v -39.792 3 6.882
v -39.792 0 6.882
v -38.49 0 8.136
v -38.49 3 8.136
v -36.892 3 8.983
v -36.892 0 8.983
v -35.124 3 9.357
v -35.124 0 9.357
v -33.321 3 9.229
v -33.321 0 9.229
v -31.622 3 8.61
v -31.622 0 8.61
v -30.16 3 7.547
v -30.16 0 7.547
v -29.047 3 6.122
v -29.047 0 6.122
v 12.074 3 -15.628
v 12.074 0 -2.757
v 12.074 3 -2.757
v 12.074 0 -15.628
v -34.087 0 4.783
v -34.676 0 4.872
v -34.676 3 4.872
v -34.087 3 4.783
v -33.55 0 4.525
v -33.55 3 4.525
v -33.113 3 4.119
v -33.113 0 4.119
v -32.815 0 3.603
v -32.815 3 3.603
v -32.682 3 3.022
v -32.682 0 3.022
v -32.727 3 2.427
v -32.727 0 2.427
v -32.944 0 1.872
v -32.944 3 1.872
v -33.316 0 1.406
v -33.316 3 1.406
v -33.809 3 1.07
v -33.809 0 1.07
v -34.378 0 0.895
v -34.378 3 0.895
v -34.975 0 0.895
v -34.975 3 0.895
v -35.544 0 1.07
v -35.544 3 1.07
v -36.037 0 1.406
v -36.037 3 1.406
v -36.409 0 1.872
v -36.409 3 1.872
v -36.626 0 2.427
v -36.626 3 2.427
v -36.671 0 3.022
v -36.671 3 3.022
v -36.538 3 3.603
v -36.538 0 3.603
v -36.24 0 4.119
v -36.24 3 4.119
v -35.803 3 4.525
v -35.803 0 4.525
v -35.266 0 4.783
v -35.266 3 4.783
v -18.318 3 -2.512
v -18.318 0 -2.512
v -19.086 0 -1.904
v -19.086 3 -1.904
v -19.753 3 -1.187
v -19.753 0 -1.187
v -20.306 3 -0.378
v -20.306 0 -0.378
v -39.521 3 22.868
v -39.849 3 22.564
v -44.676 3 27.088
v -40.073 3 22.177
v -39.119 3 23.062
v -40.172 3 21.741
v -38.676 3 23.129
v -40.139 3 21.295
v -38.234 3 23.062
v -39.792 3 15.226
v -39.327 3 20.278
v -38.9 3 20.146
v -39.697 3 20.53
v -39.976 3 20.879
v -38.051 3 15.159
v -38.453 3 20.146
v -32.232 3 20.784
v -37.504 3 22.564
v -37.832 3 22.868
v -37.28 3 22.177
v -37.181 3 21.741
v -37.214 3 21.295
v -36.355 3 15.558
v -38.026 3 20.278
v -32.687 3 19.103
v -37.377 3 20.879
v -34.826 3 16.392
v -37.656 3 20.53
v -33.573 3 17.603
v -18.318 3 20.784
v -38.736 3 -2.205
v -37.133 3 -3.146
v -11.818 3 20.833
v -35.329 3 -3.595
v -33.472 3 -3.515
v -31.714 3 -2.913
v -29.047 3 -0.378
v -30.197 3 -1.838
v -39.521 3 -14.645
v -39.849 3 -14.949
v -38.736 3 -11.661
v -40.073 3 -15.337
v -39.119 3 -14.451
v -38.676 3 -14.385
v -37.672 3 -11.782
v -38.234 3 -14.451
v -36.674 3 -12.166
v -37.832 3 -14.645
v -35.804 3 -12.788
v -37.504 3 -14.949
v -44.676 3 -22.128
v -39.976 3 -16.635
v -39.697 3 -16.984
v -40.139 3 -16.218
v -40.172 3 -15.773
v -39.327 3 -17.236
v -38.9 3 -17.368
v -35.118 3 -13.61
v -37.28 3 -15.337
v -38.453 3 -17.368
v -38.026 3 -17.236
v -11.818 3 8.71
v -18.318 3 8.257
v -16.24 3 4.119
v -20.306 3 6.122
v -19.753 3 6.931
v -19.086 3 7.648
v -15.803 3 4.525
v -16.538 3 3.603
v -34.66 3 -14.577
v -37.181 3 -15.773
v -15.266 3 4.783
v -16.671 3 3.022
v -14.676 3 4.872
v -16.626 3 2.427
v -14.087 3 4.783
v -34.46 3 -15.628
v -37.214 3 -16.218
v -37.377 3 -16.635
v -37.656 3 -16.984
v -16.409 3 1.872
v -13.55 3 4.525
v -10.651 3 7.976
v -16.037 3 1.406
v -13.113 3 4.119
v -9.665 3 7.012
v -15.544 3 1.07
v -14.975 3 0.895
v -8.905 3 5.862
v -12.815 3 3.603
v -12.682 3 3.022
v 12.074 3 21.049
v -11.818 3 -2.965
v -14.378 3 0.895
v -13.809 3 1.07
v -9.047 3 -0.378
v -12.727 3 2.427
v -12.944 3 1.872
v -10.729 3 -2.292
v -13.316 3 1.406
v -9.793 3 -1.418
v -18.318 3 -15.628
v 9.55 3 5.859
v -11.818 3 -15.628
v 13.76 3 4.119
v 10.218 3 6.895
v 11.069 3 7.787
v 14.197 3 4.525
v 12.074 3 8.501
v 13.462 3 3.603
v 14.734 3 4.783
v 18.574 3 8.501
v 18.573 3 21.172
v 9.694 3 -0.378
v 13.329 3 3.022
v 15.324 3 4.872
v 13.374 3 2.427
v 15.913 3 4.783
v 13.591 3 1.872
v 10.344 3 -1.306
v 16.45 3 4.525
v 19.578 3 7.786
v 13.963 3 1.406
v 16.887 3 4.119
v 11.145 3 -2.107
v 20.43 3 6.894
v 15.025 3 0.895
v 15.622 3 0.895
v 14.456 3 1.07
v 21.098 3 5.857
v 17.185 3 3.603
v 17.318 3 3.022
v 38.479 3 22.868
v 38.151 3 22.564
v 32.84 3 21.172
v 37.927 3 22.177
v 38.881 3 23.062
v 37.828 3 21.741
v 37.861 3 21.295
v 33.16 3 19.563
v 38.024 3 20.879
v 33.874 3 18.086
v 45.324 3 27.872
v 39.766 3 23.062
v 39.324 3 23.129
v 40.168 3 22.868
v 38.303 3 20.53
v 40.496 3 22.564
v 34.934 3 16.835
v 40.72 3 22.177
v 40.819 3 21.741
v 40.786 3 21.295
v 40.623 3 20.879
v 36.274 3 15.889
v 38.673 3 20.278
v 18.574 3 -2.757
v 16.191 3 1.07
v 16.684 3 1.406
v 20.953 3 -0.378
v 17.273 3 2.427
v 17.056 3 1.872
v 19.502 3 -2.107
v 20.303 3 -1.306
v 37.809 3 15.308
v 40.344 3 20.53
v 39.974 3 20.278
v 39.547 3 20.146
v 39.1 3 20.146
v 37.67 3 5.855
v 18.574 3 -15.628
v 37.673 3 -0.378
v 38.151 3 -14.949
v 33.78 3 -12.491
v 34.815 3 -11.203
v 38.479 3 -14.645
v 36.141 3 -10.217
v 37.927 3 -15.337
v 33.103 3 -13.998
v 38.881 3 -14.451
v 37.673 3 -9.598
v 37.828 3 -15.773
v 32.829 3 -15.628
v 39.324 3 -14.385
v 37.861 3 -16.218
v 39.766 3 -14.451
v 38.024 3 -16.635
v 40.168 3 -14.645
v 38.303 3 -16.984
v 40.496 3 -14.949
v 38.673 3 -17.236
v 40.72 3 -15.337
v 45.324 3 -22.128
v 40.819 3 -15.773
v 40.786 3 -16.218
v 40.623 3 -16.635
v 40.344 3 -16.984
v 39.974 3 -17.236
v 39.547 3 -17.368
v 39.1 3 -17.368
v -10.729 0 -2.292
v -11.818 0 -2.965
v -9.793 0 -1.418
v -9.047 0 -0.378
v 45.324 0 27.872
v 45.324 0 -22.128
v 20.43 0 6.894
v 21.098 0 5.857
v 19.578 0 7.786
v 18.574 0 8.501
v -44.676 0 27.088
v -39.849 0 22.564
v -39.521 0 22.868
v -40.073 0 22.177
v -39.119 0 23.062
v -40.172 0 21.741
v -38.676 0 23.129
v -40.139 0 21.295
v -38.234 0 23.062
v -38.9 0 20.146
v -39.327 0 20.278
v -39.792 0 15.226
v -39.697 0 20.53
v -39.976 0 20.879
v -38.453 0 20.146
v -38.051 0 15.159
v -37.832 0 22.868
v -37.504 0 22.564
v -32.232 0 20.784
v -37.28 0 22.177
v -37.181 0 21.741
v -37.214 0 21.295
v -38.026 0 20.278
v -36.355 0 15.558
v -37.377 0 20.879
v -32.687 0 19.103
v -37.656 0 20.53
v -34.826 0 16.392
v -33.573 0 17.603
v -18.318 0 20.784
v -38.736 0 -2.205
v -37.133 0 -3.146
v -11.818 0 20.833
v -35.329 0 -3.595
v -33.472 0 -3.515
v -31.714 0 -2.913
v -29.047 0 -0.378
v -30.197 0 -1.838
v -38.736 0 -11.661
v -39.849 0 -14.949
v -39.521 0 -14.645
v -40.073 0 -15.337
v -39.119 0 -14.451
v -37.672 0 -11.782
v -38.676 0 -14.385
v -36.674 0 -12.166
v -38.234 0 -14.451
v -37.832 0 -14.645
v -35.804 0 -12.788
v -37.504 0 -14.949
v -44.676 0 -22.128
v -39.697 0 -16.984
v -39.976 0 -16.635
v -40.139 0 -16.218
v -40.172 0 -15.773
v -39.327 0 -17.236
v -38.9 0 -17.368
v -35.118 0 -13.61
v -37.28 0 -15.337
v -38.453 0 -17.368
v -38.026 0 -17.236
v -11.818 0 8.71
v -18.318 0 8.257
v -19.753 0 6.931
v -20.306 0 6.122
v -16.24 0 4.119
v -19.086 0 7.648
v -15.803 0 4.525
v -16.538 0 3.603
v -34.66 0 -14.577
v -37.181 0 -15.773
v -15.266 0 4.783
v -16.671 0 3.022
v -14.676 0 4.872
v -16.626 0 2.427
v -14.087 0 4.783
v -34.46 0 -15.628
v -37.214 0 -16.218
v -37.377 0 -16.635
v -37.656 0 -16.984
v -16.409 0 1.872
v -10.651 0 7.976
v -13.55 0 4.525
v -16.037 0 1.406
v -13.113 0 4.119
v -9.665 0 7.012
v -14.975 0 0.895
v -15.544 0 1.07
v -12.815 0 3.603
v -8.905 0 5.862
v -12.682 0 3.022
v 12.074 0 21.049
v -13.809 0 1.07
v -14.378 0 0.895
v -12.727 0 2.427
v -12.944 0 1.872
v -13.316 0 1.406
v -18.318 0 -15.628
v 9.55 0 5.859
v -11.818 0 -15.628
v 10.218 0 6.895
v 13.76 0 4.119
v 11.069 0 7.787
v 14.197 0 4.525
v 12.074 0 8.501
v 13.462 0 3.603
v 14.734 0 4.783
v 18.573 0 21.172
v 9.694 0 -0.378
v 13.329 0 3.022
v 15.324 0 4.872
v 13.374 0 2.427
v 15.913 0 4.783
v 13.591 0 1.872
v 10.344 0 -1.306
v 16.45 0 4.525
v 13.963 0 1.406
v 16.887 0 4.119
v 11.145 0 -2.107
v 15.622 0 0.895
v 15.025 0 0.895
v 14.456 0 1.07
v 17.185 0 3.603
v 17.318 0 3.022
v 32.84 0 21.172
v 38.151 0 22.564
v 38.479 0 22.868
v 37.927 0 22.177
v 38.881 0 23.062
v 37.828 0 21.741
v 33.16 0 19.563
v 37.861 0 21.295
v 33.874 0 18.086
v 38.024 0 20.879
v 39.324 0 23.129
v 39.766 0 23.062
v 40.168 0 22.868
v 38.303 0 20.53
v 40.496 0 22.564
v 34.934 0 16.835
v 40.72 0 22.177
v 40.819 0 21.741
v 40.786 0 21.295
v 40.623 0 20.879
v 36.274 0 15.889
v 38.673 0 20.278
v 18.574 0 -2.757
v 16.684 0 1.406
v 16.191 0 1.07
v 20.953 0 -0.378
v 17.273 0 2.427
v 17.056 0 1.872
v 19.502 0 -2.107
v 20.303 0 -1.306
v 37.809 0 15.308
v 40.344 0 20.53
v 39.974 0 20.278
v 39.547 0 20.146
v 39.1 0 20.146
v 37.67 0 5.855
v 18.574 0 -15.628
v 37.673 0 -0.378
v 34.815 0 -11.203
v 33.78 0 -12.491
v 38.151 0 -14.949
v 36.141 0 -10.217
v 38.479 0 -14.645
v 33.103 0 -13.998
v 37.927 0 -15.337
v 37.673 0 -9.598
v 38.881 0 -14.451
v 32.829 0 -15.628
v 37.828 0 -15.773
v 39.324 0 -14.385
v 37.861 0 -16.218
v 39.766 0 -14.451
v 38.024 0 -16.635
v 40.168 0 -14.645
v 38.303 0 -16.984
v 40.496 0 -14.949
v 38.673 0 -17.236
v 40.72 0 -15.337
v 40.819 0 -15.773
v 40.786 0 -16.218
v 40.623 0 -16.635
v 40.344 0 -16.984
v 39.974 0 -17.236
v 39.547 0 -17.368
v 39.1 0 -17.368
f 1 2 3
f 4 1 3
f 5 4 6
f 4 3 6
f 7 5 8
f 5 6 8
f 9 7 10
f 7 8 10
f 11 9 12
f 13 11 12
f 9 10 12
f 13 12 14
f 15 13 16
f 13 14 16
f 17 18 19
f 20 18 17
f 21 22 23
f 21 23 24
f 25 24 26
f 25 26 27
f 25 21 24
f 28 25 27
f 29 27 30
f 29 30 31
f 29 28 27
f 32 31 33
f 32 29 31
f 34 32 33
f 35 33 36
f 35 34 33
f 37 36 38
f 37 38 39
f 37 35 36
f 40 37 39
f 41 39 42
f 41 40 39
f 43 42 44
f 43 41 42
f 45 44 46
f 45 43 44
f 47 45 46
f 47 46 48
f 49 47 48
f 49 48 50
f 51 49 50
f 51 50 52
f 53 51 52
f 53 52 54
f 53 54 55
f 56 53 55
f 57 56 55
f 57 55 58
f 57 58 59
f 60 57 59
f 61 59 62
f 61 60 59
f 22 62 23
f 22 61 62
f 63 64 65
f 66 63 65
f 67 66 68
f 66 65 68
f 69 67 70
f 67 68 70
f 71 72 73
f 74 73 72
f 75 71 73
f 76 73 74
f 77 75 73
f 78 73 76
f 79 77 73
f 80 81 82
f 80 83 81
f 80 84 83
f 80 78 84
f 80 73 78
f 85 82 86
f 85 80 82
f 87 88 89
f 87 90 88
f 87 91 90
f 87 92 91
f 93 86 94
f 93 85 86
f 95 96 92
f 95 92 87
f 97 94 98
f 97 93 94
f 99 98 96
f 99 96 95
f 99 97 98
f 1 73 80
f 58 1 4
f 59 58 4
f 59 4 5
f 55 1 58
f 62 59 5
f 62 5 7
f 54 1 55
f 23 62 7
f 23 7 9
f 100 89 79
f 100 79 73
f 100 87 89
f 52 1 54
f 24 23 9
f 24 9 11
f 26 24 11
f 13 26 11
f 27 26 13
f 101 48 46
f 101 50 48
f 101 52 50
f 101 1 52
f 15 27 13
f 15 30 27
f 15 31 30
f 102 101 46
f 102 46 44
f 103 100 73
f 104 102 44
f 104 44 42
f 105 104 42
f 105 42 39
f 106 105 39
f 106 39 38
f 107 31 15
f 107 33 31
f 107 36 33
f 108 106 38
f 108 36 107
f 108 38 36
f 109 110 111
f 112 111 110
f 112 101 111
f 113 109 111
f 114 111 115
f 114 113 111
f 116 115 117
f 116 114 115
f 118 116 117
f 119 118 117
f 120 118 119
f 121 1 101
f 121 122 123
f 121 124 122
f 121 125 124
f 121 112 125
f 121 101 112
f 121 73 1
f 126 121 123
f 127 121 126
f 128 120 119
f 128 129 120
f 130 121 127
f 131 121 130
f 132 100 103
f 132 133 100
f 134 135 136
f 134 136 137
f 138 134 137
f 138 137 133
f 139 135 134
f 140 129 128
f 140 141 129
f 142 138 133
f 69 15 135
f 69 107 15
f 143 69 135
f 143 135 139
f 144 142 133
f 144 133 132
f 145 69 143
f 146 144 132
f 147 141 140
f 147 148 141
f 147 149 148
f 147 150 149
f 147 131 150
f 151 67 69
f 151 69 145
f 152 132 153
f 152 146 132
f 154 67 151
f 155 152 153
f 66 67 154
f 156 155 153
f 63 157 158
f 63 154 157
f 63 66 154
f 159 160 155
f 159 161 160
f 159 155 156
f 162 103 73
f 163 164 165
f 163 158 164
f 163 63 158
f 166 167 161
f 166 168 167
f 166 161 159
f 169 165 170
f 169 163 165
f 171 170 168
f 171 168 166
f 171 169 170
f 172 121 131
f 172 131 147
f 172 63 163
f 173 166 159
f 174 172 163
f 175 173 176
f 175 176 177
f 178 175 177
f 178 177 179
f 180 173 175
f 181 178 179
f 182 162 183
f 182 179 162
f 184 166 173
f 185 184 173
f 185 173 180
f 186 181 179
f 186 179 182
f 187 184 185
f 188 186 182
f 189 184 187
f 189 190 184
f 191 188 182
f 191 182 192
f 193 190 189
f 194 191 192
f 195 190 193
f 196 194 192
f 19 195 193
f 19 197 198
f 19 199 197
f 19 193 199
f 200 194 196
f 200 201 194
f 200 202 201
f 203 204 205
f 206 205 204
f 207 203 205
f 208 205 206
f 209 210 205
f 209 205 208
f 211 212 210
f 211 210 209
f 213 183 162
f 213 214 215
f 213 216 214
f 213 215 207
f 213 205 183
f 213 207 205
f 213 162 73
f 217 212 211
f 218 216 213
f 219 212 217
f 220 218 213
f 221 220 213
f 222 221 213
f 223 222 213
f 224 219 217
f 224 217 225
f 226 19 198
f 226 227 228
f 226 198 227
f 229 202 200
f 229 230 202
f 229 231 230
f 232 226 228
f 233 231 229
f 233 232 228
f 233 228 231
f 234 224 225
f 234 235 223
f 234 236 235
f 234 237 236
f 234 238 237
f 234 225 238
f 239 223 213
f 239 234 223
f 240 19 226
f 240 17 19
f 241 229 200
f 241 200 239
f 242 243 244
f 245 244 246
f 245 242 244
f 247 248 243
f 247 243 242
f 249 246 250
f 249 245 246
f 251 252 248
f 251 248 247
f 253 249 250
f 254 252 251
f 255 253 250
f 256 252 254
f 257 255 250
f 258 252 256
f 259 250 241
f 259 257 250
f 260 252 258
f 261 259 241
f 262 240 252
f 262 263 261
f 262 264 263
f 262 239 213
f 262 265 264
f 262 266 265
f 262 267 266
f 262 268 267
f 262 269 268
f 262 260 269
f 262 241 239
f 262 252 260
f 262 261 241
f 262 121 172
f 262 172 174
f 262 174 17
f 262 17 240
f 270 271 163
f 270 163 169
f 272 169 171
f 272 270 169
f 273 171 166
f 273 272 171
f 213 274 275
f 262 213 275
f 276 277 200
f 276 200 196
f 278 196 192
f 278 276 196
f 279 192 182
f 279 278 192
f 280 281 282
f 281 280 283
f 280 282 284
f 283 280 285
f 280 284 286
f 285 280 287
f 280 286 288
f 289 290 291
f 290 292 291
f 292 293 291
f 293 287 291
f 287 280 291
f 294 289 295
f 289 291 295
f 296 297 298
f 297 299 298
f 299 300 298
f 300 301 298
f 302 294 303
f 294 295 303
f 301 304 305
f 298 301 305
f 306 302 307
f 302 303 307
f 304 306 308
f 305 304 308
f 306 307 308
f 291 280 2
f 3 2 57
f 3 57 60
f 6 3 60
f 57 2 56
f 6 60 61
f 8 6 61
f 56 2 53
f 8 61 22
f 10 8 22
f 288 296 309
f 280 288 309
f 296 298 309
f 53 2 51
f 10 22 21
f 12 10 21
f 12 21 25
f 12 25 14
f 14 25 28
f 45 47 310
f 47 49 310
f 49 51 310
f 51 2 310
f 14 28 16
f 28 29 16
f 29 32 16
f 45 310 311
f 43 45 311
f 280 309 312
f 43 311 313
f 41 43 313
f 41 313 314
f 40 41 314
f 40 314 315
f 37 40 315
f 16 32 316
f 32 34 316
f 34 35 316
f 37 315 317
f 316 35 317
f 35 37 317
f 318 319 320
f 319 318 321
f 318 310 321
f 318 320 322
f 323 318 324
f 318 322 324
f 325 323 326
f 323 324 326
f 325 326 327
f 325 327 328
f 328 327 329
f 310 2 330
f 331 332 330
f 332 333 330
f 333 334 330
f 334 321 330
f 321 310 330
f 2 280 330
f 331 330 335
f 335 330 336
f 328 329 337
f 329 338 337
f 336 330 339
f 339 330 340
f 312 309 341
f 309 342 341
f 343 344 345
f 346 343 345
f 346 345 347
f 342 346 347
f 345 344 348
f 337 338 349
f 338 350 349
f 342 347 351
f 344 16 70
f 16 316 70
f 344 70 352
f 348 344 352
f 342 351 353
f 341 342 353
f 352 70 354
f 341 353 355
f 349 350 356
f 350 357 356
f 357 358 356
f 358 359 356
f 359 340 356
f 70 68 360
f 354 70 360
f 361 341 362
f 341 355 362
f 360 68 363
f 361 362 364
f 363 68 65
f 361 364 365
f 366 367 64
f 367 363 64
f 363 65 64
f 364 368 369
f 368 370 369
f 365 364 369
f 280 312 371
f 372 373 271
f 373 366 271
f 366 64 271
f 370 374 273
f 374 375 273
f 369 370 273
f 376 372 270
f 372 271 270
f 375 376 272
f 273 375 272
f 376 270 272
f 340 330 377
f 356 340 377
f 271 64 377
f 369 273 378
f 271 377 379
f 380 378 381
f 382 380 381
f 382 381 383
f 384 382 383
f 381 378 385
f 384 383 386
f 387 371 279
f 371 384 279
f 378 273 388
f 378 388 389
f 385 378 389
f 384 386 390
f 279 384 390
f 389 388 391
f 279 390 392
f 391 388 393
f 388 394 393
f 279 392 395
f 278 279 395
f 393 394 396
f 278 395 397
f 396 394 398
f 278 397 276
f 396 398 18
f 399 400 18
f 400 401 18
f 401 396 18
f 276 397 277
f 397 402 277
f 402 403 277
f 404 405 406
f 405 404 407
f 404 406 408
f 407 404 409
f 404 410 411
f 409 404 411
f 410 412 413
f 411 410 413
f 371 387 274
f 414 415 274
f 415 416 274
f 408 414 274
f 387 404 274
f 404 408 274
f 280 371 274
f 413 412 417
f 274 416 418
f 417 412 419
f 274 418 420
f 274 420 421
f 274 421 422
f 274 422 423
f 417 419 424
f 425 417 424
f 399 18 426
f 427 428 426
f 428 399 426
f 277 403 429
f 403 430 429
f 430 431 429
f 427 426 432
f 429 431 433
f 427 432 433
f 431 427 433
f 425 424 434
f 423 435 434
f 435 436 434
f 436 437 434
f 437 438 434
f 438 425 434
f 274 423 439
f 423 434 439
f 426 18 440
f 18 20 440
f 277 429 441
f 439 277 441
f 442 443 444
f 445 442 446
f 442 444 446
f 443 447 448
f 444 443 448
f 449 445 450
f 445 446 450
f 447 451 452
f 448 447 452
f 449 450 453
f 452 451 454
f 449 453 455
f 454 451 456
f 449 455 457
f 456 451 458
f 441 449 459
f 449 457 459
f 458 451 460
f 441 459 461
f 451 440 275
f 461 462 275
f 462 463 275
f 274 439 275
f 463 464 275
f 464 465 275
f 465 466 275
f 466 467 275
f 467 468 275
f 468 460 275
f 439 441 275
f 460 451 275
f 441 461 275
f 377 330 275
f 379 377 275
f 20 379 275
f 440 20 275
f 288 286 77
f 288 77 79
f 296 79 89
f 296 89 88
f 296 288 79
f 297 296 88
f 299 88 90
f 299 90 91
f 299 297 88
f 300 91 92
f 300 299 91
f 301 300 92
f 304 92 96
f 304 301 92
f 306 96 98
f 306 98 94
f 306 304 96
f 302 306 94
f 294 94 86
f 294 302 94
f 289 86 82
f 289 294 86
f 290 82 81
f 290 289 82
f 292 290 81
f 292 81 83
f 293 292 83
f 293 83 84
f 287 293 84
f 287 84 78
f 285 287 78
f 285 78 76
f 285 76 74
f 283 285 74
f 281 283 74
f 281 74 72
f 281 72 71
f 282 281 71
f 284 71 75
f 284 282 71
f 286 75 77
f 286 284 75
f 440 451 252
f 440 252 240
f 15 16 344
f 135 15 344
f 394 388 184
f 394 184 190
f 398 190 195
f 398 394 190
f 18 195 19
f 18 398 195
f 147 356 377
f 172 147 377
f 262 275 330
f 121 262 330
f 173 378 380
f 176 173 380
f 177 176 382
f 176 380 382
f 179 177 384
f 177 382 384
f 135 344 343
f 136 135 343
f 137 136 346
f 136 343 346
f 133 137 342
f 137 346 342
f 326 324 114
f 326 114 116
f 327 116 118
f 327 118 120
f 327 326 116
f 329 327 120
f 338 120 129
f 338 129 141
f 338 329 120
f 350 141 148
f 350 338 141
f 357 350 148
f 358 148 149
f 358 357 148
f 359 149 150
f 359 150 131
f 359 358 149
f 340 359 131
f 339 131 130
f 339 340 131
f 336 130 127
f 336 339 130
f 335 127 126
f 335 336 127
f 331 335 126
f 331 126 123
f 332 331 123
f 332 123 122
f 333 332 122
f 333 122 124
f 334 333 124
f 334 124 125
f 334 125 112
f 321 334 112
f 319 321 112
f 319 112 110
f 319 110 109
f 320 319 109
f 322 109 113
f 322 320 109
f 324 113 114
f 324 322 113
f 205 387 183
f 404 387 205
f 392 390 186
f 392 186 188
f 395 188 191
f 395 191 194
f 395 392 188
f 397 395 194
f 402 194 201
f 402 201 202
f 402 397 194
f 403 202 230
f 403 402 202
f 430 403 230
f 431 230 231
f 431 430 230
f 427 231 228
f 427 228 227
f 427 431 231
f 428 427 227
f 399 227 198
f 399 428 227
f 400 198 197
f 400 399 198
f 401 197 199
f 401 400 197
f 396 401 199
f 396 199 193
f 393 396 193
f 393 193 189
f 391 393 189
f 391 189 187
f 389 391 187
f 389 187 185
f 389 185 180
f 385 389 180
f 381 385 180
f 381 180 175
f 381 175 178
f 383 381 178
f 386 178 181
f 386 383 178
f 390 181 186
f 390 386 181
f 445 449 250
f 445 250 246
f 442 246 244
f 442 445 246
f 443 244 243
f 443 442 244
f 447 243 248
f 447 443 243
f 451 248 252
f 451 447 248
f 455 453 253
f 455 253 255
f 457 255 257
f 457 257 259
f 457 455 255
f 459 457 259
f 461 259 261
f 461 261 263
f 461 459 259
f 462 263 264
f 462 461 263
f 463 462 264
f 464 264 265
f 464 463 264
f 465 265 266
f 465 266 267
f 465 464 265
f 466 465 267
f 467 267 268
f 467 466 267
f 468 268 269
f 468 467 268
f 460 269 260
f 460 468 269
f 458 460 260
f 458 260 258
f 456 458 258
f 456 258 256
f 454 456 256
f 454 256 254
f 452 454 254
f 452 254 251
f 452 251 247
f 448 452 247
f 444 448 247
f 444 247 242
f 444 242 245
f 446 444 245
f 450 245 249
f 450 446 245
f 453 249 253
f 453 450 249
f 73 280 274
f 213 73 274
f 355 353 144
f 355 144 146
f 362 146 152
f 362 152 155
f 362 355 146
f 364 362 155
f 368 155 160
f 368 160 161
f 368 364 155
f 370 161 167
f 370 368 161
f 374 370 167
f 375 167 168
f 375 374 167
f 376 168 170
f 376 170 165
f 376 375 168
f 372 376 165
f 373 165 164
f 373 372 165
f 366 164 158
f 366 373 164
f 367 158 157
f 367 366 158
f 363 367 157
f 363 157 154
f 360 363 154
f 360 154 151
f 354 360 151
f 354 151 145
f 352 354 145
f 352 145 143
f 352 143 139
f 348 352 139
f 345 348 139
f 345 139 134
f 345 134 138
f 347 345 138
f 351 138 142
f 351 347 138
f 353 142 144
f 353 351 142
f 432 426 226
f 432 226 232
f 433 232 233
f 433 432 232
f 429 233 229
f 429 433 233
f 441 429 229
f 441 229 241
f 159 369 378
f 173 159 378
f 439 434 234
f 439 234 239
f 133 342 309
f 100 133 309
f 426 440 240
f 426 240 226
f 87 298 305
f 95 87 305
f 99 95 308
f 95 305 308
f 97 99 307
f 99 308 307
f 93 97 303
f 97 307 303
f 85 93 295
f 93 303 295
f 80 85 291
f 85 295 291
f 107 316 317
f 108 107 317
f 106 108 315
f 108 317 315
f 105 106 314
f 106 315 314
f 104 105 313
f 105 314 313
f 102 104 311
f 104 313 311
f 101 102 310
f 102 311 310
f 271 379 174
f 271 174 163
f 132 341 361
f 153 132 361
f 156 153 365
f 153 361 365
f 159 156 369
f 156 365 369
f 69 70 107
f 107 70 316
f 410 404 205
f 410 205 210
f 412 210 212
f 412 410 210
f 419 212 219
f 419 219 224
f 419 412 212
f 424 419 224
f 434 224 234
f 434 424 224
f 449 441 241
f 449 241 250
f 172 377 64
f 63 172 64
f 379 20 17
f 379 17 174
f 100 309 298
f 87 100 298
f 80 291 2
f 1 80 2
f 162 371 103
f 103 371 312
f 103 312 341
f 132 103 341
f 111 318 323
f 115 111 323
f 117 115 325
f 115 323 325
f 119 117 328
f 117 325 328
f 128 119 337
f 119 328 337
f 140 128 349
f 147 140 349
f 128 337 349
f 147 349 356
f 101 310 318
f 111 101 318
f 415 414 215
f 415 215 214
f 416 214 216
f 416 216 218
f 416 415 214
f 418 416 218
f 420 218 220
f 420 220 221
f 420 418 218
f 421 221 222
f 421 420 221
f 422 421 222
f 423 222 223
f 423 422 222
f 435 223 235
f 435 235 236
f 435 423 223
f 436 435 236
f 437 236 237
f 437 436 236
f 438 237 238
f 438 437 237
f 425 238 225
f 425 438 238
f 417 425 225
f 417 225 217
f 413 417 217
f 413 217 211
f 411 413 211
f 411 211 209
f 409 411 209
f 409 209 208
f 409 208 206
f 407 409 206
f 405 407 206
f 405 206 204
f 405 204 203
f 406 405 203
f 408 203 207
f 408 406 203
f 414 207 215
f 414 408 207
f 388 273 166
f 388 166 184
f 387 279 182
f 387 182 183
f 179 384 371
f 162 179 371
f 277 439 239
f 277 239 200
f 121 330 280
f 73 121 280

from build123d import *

# Parameters (mm, degrees)
SKETCH1_R           = 2
SKETCH1_R_2         = 1.5
BOSS_EXTRUDE1_DEPTH = 3


with BuildPart() as part:
    # Sketch1 → Boss-Extrude1 (new body)
    with BuildSketch(Plane(origin=(0, 0, 0), x_dir=(1, 0, 0), z_dir=(0, 1, 0))):
        Polygon((-44.676492644, 22.127798429), (-44.676492644, -27.087694748), (45.323507356, -27.872201571), (45.323507356, 22.127798429), align=None)
        with Locations(Location((-14.676492644, -2.872201571, 0), (0, 0, 270))):
            Circle(SKETCH1_R, mode=Mode.SUBTRACT)
        with Locations(Location((-34.676492644, -2.872201571, 0), (0, 0, 270))):
            Circle(SKETCH1_R, mode=Mode.SUBTRACT)
        with Locations(Location((15.323507356, -2.872201571, 0), (0, 0, 270))):
            Circle(SKETCH1_R, mode=Mode.SUBTRACT)
        with Locations(Location((-38.676492644, 15.884701617, 0), (0, 0, 270))):
            Circle(SKETCH1_R_2, mode=Mode.SUBTRACT)
        with Locations(Location((-38.676492644, -21.62910476, 0), (0, 0, 270))):
            Circle(SKETCH1_R_2, mode=Mode.SUBTRACT)
        with Locations(Location((39.323507356, 15.884701617, 0), (0, 0, 270))):
            Circle(SKETCH1_R_2, mode=Mode.SUBTRACT)
        with Locations(Location((39.323507356, -21.62910476, 0), (0, 0, 270))):
            Circle(SKETCH1_R_2, mode=Mode.SUBTRACT)
        with BuildLine():
            Line((-34.460456453, 15.627798429), (-18.317725118, 15.627798429))
            Line((-18.317725118, 15.627798429), (-18.317725118, 2.512167108))
            ThreePointArc((-18.317725118, 2.512167108), (-19.4329567, 1.557928187), (-20.305657768, 0.377798429))
            Line((-20.305657768, 0.377798429), (-29.047327519, 0.377798429))
            ThreePointArc((-29.047327519, 0.377798429), (-33.472098814, 3.51524201), (-38.735588684, 2.204582778))
            Line((-38.735588684, 2.204582778), (-38.735588684, 11.661258938))
            ThreePointArc((-38.735588684, 11.661258938), (-35.803620086, 12.788322495), (-34.460456453, 15.627798429))
        make_face(mode=Mode.SUBTRACT)
        with BuildLine():
            Line((-11.817725118, 15.627798429), (-11.817725118, 2.965387677))
            ThreePointArc((-11.817725118, 2.965387677), (-10.2396971, 1.878045296), (-9.047327519, 0.377798429))
            Line((-9.047327519, 0.377798429), (9.694342232, 0.377798429))
            ThreePointArc((9.694342232, 0.377798429), (10.727313279, 1.723992507), (12.073507356, 2.756963553))
            Line((12.073507356, 2.756963553), (12.073507356, 15.627798429))
            Line((12.073507356, 15.627798429), (-11.817725118, 15.627798429))
        make_face(mode=Mode.SUBTRACT)
        with BuildLine():
            Line((-8.904779675, -5.861738225), (9.550345172, -5.858938653))
            ThreePointArc((9.550345172, -5.858938653), (10.622446791, -7.361080001), (12.073507356, -8.501366696))
            Line((12.073507356, -8.501366696), (12.073507356, -21.048878052))
            Line((12.073507356, -21.048878052), (-11.817725118, -20.833017395))
            Line((-11.817725118, -20.833017395), (-11.817725118, -8.709790819))
            ThreePointArc((-11.817725118, -8.709790819), (-10.132359141, -7.519873108), (-8.904779675, -5.861738225))
        make_face(mode=Mode.SUBTRACT)
        with BuildLine():
            Line((-18.317725118, -8.25657025), (-18.317725118, -20.784452687))
            Line((-18.317725118, -20.784452687), (-32.231606076, -20.784452687))
            ThreePointArc((-32.231606076, -20.784452687), (-34.826040106, -16.392310392), (-39.79198853, -15.225537869))
            Line((-39.79198853, -15.225537869), (-39.79198853, -6.882401296))
            ThreePointArc((-39.79198853, -6.882401296), (-34.217755326, -9.355993677), (-29.047327519, -6.122201571))
            Line((-29.047327519, -6.122201571), (-20.305657768, -6.122201571))
            ThreePointArc((-20.305657768, -6.122201571), (-19.4329567, -7.30233133), (-18.317725118, -8.25657025))
        make_face(mode=Mode.SUBTRACT)
        with BuildLine():
            Line((18.573507356, 15.627798429), (18.573507356, 2.756963553))
            ThreePointArc((18.573507356, 2.756963553), (19.919701434, 1.723992507), (20.952672481, 0.377798429))
            Line((20.952672481, 0.377798429), (37.672865612, 0.377798429))
            Line((37.672865612, 0.377798429), (37.672865612, 9.597780127))
            ThreePointArc((37.672865612, 9.597780127), (34.256177793, 11.81380846), (32.828586206, 15.627798429))
            Line((32.828586206, 15.627798429), (18.573507356, 15.627798429))
        make_face(mode=Mode.SUBTRACT)
        with BuildLine():
            Line((18.573507356, -8.501366696), (18.573423049, -21.172157696))
            Line((18.573423049, -21.172157696), (32.839588836, -21.172157696))
            ThreePointArc((32.839588836, -21.172157696), (34.364481553, -17.426954943), (37.808645365, -15.308092725))
            Line((37.808645365, -15.308092725), (37.669780925, -5.854673043))
            Line((37.669780925, -5.854673043), (21.097575428, -5.857186983))
            ThreePointArc((21.097575428, -5.857186983), (20.025248813, -7.360366817), (18.573507356, -8.501366696))
        make_face(mode=Mode.SUBTRACT)
    extrude(amount=BOSS_EXTRUDE1_DEPTH)


solid = part.part
